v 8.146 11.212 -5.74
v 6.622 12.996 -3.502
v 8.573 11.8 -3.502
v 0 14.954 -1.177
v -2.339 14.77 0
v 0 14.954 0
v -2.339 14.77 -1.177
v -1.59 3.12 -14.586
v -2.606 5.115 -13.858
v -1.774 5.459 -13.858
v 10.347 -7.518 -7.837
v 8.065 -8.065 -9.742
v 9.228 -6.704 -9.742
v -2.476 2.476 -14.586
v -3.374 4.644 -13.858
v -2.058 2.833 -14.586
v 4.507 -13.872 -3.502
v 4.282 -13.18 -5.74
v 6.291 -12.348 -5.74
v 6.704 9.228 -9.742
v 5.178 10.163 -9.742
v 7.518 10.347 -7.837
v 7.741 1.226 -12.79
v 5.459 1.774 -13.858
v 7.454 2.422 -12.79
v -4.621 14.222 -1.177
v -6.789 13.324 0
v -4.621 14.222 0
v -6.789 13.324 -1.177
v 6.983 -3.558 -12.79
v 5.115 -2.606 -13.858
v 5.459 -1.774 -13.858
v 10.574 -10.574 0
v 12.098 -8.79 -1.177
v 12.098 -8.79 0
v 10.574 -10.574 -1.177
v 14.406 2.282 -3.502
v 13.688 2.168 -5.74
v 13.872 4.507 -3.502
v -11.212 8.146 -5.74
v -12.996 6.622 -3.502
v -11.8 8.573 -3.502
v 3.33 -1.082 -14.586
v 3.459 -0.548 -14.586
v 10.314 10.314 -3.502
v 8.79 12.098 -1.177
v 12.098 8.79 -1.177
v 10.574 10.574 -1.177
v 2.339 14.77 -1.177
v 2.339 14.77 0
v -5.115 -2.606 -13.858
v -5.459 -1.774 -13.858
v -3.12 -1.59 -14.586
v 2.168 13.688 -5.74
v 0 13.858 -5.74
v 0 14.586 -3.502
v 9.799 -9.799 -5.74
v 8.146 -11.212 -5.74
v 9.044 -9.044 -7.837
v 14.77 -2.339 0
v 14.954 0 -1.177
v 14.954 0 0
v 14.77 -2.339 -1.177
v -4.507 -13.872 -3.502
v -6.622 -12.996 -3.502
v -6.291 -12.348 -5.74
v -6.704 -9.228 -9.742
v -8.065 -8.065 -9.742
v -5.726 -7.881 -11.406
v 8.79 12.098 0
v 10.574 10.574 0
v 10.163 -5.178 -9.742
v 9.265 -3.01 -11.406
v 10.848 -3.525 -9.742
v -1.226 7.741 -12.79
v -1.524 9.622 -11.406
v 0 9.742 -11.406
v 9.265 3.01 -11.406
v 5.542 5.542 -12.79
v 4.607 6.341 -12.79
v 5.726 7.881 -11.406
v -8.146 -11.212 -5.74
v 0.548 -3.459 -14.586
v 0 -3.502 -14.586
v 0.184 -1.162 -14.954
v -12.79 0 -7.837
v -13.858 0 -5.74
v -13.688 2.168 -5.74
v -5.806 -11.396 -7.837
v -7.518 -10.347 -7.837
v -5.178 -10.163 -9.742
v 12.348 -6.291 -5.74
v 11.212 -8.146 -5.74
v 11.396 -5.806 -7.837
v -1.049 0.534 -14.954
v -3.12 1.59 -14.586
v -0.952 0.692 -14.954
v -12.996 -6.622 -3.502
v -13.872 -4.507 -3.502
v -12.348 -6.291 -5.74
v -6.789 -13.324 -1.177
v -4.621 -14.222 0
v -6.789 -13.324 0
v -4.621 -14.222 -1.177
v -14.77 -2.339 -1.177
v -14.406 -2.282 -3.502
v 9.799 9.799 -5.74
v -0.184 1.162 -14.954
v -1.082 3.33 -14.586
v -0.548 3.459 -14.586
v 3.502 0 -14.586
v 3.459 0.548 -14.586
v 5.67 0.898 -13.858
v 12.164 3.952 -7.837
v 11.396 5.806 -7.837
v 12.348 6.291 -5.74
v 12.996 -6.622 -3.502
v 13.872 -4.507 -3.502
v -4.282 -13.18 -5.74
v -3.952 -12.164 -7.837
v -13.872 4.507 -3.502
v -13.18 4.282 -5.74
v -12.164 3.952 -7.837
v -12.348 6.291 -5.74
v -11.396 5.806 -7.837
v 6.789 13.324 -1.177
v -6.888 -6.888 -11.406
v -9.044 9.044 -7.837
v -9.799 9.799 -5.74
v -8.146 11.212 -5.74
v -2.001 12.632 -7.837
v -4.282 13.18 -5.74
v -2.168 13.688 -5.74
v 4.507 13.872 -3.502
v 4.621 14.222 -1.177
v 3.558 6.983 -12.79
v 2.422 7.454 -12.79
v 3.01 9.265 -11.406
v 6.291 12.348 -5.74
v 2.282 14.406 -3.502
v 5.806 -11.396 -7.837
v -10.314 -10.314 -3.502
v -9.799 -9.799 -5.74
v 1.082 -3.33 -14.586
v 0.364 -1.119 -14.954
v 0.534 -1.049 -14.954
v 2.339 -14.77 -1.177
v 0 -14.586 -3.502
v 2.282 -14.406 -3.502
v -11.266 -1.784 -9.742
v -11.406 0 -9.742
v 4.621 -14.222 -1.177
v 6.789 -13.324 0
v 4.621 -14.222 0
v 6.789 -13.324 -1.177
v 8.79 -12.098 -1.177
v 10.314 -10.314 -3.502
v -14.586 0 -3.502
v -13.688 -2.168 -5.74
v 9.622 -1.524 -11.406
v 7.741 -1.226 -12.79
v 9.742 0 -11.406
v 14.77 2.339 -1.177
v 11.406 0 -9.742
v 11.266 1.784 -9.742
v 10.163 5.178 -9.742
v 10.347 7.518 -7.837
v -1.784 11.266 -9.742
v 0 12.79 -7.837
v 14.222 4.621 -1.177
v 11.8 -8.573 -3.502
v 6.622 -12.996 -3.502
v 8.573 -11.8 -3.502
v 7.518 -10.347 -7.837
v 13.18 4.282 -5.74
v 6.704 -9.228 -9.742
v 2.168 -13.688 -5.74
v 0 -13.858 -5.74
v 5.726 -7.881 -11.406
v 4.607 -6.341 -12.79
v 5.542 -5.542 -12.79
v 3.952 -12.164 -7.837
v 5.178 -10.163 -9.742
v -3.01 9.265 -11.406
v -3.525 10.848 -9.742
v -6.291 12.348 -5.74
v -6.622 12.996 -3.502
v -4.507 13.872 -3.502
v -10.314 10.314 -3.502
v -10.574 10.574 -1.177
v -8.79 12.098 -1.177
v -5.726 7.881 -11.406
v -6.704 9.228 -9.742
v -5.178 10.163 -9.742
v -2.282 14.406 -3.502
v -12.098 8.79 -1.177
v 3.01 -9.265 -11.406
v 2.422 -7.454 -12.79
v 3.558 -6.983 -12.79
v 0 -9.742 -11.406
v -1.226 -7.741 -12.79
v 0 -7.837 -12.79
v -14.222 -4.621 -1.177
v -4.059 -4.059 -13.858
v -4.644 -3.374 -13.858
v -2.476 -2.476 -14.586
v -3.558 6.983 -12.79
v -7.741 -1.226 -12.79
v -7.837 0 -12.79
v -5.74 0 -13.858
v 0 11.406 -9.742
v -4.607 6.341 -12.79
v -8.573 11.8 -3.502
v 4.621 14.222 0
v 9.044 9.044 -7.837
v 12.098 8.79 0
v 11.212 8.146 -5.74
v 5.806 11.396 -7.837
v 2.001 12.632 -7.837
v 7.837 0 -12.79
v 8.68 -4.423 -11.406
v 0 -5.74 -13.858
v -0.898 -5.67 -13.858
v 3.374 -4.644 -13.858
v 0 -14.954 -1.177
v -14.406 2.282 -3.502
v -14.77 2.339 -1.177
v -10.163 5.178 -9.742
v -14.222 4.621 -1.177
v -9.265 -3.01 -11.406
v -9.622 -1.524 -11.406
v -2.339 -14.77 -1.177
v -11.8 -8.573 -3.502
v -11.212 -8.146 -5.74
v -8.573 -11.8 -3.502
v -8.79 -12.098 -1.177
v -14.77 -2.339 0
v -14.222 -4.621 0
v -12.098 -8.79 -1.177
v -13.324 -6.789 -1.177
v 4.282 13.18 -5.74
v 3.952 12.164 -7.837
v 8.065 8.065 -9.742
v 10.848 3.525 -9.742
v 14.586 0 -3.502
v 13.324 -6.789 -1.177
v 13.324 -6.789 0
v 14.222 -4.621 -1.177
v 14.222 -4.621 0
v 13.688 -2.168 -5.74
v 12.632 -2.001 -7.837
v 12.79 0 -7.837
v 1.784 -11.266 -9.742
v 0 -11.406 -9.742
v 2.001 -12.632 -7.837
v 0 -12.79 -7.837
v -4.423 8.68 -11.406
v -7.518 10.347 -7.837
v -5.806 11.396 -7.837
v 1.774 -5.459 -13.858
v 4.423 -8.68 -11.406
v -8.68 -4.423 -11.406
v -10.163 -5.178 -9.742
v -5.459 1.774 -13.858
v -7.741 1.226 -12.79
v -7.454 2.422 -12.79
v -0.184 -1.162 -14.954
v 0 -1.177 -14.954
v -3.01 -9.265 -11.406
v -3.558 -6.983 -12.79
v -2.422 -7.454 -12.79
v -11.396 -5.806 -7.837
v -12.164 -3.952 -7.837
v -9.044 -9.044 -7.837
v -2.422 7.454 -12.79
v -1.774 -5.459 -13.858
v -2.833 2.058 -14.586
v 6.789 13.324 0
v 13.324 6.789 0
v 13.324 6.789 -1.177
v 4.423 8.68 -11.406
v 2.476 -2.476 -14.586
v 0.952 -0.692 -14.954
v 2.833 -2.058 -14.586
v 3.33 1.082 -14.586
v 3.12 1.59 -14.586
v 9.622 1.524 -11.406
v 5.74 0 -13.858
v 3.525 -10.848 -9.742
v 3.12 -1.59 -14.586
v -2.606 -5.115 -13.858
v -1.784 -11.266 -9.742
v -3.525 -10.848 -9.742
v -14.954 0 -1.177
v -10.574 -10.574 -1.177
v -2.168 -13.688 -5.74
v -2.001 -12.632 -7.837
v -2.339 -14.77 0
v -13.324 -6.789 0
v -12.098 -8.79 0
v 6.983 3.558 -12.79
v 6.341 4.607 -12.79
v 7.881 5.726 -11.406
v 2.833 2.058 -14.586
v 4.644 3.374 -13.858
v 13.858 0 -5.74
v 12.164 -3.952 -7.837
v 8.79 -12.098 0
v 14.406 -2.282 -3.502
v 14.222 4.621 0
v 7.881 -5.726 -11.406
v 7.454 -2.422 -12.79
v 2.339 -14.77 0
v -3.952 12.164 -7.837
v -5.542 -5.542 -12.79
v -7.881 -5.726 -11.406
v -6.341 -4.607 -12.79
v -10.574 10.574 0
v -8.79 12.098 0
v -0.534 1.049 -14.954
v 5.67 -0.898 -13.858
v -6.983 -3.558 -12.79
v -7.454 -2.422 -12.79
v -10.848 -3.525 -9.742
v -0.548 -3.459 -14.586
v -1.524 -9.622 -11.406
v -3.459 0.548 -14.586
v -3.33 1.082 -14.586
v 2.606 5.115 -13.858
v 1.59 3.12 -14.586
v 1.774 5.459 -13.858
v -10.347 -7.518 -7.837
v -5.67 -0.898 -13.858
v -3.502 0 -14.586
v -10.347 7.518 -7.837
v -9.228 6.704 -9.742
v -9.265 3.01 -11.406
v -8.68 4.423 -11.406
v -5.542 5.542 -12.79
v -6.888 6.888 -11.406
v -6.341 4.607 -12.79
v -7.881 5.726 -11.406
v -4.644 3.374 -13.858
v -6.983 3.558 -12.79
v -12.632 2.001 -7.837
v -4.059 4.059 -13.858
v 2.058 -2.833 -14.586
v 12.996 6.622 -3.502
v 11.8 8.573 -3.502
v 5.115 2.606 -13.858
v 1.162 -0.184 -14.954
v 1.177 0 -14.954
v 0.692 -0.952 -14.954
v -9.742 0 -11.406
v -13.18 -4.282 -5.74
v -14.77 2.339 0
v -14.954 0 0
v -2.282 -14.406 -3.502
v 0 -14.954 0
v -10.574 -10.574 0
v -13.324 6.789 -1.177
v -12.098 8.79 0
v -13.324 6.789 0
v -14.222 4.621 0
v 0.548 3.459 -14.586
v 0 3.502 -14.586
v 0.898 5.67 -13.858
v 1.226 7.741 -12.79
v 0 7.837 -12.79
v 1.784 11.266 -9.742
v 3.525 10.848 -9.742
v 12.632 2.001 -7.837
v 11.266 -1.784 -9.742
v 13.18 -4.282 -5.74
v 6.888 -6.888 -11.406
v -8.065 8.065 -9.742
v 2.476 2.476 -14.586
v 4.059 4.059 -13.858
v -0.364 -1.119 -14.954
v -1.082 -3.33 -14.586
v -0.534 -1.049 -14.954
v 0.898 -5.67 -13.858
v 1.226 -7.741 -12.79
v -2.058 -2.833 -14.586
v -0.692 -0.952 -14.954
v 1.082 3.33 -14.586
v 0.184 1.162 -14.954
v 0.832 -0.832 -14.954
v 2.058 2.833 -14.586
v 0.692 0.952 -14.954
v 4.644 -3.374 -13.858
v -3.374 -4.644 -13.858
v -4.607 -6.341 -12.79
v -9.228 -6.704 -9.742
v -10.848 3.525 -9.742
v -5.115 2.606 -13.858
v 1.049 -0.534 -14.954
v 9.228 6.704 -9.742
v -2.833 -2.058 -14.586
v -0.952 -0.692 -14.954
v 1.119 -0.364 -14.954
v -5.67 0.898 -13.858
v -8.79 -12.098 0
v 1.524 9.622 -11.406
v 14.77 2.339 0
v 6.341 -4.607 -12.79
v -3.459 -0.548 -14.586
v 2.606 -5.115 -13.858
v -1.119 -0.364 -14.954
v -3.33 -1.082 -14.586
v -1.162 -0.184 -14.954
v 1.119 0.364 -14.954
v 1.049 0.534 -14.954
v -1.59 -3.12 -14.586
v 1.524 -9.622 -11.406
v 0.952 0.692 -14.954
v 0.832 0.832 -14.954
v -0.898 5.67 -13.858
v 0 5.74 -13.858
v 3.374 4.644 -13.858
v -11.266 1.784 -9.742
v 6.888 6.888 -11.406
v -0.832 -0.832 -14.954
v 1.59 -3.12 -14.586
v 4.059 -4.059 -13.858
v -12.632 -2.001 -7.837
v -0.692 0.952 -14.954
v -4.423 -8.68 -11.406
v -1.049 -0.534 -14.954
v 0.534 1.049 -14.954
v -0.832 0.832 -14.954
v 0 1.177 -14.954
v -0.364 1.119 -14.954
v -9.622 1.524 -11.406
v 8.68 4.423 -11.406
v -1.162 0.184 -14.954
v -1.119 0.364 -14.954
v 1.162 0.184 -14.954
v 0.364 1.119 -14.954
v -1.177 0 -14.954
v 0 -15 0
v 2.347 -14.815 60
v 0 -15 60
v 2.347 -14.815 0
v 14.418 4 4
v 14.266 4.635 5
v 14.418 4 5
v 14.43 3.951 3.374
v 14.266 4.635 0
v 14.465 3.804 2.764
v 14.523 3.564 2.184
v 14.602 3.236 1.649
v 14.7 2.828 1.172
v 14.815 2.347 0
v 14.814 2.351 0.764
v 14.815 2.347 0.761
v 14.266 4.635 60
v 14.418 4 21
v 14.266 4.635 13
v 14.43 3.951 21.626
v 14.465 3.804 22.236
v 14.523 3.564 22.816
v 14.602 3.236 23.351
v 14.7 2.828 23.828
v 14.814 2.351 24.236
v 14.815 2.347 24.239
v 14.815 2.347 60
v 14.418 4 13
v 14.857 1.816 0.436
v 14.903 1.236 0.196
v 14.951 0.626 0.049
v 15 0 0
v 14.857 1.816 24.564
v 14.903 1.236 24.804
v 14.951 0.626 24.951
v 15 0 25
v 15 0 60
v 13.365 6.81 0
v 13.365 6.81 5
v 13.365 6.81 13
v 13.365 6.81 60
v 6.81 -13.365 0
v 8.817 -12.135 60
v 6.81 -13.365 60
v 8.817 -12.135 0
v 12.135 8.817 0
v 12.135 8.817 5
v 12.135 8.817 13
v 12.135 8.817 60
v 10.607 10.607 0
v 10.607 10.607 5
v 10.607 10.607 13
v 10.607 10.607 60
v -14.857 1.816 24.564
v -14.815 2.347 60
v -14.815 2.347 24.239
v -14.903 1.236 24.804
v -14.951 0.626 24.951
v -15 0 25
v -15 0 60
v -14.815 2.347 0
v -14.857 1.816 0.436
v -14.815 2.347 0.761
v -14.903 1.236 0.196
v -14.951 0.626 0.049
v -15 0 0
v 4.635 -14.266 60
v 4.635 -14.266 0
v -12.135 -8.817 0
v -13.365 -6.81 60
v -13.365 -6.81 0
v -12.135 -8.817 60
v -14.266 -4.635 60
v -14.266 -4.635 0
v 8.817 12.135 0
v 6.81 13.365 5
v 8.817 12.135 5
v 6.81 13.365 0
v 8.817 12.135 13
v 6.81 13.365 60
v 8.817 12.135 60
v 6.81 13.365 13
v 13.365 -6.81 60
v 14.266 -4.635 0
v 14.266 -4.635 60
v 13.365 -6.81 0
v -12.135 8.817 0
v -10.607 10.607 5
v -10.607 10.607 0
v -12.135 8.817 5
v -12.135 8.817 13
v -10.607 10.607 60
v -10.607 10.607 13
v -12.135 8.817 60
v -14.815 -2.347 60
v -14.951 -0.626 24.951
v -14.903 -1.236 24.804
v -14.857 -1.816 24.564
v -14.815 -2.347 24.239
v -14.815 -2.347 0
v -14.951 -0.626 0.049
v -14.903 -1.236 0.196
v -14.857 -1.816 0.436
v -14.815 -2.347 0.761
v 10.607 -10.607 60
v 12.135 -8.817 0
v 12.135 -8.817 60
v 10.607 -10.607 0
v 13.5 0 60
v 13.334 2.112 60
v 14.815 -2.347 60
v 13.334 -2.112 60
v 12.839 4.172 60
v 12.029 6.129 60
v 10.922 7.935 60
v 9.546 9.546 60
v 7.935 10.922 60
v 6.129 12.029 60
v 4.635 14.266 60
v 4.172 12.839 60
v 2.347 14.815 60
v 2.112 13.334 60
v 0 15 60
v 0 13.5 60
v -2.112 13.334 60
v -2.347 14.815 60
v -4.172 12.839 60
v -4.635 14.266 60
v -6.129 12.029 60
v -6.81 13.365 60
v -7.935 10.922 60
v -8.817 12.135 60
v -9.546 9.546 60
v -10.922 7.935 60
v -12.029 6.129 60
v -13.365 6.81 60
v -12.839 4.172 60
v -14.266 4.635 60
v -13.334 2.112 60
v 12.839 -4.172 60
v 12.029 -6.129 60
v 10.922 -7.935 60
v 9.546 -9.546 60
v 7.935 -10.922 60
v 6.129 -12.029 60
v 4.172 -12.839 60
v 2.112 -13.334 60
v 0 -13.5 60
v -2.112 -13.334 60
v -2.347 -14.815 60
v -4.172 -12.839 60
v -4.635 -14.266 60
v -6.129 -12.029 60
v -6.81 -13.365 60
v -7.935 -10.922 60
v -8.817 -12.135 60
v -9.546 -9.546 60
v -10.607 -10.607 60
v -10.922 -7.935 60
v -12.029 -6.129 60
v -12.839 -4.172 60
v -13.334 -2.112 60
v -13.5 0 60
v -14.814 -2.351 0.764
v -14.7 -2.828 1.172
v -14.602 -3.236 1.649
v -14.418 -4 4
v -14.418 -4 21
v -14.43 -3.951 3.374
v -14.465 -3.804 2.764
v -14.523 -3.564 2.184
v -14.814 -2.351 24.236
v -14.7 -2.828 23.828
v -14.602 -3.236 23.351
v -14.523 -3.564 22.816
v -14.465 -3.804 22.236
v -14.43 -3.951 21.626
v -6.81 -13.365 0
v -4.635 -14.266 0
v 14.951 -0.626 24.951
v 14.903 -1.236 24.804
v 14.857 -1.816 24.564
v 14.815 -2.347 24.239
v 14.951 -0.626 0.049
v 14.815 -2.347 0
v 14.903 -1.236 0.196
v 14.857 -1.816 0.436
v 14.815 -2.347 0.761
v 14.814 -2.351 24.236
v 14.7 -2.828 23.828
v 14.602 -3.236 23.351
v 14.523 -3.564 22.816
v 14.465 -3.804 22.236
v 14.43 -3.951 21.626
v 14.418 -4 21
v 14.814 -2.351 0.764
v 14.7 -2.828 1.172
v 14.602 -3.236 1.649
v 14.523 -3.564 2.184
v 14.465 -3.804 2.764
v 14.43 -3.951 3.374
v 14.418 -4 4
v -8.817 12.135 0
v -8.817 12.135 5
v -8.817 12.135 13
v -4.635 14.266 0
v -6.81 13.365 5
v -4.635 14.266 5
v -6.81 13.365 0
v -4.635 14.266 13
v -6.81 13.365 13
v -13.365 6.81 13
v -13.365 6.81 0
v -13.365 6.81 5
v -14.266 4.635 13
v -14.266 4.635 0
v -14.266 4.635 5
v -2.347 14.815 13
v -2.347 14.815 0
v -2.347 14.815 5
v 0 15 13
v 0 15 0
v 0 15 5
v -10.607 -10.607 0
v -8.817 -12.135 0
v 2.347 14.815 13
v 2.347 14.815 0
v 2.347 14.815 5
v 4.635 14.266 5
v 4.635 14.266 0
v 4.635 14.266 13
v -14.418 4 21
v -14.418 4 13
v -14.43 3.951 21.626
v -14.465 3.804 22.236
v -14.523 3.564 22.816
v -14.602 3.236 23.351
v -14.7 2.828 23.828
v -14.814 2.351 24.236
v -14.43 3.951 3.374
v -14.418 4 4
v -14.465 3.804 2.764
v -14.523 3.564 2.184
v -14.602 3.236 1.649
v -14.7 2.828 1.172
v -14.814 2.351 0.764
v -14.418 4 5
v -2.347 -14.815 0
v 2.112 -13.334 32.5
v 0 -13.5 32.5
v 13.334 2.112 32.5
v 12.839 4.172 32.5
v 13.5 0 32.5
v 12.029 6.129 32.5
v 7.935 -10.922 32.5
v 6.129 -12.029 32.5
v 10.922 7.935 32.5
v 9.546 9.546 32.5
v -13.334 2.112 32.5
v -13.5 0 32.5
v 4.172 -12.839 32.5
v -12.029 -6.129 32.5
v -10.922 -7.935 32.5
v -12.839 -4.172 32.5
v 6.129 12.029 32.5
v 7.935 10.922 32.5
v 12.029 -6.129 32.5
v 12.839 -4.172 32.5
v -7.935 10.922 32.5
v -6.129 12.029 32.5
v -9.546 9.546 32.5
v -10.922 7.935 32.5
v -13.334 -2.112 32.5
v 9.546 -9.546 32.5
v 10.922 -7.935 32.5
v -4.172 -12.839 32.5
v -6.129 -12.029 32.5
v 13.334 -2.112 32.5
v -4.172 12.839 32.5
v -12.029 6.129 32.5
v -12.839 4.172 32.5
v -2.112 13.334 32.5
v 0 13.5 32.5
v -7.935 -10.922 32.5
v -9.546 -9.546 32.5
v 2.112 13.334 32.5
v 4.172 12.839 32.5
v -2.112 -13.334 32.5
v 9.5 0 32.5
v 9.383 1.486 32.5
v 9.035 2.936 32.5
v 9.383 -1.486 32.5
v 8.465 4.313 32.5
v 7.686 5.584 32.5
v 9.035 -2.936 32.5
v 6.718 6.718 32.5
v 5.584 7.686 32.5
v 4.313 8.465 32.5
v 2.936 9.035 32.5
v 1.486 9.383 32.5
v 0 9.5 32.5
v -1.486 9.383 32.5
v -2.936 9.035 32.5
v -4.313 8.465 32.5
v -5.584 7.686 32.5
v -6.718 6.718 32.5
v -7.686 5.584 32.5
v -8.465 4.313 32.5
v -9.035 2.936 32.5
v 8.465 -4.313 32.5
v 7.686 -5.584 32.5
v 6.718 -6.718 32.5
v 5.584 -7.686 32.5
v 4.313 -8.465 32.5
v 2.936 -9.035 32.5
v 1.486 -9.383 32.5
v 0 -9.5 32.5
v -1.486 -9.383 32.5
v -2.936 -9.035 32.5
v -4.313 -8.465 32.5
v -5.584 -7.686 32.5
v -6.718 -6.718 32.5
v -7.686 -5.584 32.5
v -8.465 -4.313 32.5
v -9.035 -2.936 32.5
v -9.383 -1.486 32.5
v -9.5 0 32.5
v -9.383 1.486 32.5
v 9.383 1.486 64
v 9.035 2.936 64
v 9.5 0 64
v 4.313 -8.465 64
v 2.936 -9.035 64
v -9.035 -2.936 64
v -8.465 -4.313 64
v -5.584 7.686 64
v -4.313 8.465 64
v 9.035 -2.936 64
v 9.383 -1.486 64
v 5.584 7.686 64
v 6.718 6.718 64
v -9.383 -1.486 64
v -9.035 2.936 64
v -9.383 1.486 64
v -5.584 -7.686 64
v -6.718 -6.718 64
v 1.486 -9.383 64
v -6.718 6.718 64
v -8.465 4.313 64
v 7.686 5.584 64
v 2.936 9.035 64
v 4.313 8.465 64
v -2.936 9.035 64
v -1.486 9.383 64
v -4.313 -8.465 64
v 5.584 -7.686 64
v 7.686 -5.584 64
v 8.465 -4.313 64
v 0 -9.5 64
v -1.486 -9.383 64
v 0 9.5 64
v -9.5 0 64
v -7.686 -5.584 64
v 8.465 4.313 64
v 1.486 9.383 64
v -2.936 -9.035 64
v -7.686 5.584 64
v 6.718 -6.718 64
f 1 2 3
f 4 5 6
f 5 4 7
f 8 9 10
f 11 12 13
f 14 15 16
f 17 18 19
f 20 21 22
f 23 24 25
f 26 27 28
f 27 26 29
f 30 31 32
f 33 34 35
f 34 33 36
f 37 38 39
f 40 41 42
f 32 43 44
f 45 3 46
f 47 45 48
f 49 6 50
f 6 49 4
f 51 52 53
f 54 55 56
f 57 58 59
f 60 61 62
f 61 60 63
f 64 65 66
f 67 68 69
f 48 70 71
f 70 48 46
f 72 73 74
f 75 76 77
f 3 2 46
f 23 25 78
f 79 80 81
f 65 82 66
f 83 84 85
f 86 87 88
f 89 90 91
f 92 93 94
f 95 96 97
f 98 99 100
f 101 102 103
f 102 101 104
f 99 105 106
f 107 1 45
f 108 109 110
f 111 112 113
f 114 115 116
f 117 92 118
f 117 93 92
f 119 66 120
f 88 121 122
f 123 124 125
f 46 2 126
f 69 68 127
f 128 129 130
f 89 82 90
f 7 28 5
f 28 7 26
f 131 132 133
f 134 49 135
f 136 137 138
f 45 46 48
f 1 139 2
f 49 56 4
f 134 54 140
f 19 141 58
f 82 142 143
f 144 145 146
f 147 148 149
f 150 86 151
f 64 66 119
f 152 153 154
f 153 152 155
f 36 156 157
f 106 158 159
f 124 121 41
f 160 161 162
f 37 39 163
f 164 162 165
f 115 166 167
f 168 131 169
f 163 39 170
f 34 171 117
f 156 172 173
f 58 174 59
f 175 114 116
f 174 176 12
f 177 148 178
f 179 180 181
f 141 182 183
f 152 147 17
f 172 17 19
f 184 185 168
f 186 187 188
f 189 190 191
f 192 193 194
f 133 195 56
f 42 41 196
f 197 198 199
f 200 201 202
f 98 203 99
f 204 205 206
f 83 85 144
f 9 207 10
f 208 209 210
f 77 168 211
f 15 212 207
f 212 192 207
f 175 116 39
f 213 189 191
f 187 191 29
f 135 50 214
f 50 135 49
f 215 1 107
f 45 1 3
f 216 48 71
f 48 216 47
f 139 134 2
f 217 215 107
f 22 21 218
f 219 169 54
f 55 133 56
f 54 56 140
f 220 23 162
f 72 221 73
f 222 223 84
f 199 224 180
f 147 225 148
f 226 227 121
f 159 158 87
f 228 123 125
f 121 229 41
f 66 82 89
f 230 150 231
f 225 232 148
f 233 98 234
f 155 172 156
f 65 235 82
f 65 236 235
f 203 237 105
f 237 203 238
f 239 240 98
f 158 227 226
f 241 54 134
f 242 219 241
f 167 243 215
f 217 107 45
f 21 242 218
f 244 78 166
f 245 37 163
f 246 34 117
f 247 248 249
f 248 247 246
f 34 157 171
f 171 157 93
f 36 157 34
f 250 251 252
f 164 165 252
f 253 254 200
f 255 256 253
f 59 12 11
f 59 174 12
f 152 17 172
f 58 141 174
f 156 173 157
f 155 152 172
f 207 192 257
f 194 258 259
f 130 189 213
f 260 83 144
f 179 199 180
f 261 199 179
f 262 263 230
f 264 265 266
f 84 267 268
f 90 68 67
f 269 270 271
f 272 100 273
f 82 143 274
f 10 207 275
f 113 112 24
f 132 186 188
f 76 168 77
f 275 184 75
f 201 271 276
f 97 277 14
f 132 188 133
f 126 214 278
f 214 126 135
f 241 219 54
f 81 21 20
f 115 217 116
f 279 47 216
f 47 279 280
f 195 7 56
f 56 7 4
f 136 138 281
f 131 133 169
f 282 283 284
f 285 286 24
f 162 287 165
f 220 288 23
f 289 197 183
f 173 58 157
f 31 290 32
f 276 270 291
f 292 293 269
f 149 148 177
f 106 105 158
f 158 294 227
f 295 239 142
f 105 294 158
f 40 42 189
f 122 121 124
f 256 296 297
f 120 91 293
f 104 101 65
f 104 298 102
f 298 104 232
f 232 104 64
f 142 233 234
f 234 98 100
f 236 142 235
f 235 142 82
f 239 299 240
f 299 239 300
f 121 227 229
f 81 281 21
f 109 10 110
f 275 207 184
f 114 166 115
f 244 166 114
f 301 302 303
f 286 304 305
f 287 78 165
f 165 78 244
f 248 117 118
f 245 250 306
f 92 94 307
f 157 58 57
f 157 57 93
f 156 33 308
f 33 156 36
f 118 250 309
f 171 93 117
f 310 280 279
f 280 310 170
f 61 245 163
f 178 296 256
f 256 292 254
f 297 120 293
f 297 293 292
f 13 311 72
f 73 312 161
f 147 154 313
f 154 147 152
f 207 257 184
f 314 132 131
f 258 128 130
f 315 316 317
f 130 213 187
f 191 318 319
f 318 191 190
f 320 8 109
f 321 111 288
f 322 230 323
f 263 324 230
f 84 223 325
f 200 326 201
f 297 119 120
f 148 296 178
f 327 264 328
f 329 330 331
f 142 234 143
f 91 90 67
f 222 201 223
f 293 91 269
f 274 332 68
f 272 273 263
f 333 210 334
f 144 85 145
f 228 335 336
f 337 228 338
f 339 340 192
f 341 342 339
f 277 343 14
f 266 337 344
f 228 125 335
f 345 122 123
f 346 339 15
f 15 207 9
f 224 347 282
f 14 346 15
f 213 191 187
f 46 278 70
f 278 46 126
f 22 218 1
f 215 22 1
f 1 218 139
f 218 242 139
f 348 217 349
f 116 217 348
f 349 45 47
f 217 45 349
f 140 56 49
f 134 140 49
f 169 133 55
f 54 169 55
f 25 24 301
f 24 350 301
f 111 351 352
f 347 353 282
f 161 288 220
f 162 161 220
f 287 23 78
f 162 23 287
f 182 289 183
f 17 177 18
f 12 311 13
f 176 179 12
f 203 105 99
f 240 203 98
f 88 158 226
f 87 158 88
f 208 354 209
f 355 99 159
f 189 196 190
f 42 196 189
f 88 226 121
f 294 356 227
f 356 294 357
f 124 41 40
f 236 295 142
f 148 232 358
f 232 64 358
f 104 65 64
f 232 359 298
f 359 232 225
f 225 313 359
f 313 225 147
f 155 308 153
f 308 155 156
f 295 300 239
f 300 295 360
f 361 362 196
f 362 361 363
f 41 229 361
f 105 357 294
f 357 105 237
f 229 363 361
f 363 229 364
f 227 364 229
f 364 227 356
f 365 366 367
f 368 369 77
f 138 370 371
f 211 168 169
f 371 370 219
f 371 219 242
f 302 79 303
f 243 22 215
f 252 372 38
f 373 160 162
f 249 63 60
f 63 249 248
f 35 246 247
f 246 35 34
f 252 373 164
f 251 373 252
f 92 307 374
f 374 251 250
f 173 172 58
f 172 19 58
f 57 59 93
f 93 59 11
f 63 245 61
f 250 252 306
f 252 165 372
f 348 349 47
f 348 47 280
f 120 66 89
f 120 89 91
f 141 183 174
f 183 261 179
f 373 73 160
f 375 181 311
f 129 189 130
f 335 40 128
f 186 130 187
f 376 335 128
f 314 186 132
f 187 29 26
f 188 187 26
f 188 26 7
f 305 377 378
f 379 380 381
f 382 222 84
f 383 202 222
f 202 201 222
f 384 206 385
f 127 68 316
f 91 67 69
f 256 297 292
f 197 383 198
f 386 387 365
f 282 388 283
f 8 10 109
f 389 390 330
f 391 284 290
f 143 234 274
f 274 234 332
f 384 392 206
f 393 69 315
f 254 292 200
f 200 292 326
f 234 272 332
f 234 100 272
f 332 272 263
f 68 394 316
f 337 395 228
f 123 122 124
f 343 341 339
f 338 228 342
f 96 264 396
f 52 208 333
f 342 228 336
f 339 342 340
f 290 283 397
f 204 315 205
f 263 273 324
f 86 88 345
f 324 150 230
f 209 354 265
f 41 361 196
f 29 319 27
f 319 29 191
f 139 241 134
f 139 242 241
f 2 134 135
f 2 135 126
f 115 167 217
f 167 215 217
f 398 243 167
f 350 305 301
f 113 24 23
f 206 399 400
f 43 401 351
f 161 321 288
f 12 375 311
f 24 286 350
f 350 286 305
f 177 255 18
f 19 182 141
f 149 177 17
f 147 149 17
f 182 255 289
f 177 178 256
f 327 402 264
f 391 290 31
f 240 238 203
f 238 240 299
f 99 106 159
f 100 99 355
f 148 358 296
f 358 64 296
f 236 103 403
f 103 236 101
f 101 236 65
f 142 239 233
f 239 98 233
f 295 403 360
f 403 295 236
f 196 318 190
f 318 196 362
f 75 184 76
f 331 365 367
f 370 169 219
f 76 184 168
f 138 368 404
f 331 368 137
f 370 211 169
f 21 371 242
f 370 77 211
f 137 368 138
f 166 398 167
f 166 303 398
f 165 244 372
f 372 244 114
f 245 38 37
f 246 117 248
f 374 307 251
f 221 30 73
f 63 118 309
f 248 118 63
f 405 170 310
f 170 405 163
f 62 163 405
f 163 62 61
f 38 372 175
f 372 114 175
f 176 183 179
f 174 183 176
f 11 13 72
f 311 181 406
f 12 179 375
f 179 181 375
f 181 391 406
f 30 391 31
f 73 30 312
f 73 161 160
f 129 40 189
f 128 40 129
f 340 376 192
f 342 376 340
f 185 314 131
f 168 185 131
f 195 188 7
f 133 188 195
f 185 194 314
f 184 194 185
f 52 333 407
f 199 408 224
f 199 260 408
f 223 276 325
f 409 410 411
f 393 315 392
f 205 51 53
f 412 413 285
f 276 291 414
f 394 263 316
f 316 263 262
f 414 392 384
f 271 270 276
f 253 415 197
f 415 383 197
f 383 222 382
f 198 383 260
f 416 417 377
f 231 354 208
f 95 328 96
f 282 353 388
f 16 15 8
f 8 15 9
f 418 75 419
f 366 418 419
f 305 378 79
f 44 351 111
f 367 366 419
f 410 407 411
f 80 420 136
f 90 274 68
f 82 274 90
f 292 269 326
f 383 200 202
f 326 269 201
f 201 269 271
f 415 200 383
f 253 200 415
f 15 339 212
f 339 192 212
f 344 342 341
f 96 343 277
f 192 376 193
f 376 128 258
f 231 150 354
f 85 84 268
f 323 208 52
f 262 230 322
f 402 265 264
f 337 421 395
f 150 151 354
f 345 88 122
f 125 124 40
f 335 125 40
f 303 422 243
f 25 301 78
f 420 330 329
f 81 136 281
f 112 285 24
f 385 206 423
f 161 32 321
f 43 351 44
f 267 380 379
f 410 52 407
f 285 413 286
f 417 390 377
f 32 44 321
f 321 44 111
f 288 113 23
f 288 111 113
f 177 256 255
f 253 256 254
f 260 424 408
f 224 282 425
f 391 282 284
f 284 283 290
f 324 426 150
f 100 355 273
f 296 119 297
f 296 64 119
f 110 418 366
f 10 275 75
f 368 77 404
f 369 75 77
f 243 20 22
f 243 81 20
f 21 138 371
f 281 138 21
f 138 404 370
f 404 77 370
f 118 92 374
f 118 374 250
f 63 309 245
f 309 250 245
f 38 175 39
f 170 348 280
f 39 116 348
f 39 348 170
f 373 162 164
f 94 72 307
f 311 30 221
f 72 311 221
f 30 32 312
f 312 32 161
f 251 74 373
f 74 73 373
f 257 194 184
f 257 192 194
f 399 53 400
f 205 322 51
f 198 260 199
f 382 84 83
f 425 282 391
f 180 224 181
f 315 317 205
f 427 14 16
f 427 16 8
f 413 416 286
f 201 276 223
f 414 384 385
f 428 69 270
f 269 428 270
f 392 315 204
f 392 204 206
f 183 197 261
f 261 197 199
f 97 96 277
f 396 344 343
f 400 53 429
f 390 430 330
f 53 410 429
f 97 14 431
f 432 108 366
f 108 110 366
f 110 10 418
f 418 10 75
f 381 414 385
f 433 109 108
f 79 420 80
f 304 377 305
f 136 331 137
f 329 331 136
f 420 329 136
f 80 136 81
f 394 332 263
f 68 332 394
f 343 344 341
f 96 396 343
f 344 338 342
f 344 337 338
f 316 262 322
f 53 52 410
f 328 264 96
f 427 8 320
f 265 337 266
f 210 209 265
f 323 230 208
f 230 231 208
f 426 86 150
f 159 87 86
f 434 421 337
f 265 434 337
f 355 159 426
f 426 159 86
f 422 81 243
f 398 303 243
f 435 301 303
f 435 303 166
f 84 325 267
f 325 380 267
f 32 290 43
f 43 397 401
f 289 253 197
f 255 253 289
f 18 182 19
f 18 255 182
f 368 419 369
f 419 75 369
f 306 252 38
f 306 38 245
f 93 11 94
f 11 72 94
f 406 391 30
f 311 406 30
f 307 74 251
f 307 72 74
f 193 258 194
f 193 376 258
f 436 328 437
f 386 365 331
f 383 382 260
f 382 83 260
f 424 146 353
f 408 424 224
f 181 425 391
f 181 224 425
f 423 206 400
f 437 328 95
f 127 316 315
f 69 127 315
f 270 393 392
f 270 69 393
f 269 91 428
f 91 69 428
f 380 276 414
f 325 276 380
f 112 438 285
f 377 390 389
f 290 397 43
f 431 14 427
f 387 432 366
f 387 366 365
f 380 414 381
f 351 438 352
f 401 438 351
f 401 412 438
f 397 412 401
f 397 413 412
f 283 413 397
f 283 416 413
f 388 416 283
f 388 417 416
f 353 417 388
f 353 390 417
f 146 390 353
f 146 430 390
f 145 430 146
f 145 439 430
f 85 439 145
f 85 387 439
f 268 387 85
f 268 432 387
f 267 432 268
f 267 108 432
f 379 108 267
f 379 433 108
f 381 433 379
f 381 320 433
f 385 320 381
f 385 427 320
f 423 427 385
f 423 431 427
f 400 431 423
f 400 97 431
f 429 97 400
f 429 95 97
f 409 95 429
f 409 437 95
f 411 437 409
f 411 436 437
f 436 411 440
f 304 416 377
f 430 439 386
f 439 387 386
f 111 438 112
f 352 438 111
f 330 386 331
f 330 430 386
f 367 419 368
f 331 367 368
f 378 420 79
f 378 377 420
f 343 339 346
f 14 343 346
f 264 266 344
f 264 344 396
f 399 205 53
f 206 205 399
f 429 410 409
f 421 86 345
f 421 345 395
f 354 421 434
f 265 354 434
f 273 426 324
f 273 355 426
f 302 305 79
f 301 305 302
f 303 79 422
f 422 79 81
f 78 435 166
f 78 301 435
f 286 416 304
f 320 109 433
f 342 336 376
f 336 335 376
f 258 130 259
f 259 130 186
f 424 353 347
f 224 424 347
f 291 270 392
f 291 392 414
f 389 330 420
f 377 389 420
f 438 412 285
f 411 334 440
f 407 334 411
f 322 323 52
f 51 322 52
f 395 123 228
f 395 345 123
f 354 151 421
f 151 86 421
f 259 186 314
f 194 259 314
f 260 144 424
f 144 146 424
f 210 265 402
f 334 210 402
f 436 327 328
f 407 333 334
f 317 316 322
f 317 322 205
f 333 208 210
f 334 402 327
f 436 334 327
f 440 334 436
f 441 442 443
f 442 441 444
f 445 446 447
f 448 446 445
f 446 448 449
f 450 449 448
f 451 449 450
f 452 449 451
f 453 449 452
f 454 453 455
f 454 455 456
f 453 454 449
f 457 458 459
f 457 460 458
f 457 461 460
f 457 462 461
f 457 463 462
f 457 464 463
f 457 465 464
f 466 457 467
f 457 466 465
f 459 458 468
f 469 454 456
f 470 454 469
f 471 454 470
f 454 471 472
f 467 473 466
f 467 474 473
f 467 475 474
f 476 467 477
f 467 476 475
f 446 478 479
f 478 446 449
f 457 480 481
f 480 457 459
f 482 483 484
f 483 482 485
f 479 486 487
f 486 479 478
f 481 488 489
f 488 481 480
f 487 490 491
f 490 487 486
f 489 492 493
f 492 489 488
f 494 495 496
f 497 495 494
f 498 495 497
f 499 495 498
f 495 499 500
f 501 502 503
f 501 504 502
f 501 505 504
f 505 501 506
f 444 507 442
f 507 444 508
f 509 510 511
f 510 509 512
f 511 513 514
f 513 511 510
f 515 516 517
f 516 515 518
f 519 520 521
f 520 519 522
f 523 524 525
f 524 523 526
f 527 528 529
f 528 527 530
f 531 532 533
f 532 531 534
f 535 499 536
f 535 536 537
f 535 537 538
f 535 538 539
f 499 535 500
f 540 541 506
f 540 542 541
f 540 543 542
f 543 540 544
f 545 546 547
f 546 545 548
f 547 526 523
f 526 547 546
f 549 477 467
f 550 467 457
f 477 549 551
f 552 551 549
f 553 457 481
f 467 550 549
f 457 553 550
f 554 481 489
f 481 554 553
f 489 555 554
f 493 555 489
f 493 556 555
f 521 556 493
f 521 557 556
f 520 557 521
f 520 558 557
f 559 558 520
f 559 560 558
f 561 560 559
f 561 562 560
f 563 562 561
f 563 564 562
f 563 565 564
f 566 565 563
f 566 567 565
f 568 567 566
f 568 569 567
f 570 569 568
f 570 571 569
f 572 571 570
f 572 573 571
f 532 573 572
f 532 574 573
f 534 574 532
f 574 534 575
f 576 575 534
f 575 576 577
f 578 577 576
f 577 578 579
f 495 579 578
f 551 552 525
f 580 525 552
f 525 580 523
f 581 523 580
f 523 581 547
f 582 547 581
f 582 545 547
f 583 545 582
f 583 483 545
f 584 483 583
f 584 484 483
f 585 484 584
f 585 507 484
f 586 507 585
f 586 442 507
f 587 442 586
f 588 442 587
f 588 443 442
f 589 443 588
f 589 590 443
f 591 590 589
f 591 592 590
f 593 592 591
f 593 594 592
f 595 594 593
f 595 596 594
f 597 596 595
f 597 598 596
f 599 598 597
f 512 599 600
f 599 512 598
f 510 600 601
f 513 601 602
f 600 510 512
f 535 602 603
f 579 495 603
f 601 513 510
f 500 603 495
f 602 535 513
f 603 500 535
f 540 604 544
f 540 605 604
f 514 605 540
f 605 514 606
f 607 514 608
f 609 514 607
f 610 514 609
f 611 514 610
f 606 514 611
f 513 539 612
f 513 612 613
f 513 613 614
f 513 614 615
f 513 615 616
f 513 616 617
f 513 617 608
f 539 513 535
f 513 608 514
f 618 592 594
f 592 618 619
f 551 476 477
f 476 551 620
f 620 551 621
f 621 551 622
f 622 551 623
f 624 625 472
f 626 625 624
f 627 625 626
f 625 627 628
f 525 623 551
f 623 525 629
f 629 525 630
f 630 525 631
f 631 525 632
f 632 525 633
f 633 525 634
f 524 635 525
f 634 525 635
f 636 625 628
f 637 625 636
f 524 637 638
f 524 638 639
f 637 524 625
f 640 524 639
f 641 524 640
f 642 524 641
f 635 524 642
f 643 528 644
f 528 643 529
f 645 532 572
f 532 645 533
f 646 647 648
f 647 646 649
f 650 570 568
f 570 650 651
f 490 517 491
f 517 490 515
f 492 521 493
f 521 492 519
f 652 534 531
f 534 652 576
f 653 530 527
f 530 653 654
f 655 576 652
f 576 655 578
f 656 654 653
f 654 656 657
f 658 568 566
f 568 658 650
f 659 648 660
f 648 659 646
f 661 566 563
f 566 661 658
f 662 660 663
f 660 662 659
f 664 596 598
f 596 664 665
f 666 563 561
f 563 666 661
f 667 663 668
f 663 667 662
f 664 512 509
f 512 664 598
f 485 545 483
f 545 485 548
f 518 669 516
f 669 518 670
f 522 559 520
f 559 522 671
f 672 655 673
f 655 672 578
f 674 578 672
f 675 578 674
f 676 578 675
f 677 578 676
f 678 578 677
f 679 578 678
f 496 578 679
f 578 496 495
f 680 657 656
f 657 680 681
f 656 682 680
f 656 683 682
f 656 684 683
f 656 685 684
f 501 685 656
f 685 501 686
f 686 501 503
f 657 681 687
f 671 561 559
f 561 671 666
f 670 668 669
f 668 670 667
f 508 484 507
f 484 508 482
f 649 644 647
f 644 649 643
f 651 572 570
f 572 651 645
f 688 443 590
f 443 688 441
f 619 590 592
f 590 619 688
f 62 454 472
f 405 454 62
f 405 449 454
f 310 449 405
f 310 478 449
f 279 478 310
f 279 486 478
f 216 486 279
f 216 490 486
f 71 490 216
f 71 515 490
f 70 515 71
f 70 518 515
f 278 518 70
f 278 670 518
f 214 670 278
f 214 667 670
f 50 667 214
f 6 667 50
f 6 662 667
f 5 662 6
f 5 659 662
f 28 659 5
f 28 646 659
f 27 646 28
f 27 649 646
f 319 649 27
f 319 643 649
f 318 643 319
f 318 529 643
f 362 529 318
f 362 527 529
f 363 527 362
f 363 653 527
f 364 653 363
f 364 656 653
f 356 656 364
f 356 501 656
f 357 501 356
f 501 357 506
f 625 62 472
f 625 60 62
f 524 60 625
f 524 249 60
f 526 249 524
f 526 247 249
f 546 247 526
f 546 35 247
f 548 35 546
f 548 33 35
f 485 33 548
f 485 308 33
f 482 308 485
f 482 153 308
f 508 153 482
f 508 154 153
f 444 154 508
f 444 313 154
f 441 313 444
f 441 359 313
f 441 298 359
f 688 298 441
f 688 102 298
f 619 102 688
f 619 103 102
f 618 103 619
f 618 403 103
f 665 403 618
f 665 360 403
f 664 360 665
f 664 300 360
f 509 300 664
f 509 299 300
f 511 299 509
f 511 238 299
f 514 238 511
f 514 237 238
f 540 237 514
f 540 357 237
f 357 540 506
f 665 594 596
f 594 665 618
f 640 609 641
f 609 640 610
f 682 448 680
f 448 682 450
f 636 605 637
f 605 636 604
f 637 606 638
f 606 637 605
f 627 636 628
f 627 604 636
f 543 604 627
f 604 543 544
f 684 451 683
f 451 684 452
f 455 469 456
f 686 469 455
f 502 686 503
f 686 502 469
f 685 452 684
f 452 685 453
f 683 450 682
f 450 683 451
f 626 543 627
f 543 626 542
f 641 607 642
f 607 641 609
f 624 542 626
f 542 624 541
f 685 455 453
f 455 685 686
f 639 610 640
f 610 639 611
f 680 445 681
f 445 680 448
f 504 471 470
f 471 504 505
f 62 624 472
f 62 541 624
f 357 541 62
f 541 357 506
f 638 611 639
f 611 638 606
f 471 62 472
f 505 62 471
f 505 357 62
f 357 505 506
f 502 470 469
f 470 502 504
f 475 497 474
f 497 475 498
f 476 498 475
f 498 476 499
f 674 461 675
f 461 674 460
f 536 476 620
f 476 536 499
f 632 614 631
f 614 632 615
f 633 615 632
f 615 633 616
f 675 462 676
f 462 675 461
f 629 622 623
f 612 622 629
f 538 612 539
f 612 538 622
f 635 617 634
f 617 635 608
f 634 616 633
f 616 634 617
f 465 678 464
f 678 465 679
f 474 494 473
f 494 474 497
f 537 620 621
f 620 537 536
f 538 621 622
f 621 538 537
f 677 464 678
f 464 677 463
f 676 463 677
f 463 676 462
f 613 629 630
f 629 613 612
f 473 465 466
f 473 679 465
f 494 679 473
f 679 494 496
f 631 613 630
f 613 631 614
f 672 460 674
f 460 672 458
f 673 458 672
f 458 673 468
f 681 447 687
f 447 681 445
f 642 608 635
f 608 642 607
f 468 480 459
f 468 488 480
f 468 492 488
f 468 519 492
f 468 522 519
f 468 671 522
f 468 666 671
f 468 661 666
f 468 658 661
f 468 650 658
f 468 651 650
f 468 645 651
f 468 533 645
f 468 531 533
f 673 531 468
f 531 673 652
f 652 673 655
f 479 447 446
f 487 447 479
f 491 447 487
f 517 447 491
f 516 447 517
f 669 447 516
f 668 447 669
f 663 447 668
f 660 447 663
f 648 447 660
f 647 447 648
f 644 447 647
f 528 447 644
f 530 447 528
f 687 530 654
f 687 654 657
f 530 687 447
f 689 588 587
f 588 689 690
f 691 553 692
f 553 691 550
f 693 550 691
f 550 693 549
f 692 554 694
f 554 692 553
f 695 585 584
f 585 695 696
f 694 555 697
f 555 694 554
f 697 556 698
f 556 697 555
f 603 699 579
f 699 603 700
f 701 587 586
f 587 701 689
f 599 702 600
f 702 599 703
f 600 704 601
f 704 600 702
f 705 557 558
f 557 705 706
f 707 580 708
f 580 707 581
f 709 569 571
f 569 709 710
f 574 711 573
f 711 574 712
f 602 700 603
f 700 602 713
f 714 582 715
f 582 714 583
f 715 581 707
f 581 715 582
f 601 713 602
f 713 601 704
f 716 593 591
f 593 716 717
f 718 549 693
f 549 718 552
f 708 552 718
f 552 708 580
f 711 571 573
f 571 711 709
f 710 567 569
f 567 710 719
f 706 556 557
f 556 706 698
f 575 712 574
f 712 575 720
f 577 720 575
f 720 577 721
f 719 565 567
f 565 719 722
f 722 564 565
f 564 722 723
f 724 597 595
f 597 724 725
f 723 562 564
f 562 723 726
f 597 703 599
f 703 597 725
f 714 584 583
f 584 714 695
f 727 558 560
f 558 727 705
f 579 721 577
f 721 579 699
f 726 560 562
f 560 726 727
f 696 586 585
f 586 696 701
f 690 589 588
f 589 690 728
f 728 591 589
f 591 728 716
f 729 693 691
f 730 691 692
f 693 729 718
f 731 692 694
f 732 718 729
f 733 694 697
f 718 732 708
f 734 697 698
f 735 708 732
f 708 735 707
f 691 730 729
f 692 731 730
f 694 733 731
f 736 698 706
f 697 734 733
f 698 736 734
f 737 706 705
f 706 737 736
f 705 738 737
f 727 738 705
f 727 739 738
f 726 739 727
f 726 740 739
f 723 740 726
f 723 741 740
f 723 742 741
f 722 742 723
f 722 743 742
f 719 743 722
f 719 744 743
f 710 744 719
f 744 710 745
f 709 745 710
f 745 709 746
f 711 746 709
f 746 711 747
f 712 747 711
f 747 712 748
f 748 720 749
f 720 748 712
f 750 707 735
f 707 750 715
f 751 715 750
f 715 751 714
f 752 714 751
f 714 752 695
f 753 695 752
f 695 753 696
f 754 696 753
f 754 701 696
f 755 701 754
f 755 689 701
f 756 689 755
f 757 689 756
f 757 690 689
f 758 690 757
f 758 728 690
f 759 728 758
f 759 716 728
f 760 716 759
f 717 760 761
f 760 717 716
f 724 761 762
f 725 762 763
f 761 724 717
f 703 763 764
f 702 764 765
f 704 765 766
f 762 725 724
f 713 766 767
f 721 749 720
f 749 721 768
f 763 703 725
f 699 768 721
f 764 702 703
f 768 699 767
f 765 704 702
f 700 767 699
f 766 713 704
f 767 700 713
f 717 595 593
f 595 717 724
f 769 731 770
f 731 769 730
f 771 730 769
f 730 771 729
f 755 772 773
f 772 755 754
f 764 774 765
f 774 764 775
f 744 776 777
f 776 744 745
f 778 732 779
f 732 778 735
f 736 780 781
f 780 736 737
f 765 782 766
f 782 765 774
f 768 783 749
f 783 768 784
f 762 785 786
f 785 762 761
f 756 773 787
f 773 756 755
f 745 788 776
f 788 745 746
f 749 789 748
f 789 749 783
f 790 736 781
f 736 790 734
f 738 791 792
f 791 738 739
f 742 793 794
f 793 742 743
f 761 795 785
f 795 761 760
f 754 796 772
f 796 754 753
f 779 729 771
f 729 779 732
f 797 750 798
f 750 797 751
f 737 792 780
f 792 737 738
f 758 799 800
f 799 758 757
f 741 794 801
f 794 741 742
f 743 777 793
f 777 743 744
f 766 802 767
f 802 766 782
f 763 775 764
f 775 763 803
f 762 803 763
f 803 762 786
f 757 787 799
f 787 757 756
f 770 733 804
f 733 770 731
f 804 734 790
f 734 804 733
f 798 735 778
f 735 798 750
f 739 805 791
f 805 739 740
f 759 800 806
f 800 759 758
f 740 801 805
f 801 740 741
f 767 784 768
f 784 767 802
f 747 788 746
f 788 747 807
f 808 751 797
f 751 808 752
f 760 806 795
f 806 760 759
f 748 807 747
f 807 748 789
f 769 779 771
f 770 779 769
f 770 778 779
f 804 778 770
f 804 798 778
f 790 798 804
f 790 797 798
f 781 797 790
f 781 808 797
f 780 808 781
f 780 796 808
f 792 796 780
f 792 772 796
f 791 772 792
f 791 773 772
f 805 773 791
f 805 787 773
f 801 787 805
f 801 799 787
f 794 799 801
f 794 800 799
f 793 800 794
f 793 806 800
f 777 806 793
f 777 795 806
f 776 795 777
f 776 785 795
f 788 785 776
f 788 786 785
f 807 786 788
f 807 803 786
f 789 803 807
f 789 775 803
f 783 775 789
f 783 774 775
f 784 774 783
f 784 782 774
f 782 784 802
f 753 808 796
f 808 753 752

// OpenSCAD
module clip(clip_height = 30, clip_inner = 25, clip_width = 8, depth = 40, entry_height = 12) {
    rotate([0, 270, 0])
    union() {
        translate([clip_width / 2, 0, 0]) cylinder(r = clip_width / 2, h = depth, center = true);
        translate([clip_inner - (clip_width / 2), 0, 0]) cylinder(r = clip_width / 2, h = depth, center = true);
        translate([clip_width / 2, - clip_width / 2 , - depth / 2]) cube([clip_inner - clip_width, clip_width, depth]);
    }
    translate([-depth / 2, 0, clip_inner - entry_height - clip_width]) cube([depth, depth, clip_width]);
}

module net_holder(outer_radius = 15, sleeve = 30, $fn = 40) {
    clip_height = 30;
    
    difference() {
        // outer shape
        union() {
            sphere(r = outer_radius, $fn = $fn);
            cylinder(r = outer_radius, h = sleeve + clip_height, $fn = $fn);
        }
        union() {
            translate([0, 0, clip_height + 2.5]) cylinder(r = (27 / 2), h = 40);
            clip();
        }
    }
    translate([0, 0, clip_height]) cylinder (r = 9.5, h = 34);
}

net_holder();
//clip();
